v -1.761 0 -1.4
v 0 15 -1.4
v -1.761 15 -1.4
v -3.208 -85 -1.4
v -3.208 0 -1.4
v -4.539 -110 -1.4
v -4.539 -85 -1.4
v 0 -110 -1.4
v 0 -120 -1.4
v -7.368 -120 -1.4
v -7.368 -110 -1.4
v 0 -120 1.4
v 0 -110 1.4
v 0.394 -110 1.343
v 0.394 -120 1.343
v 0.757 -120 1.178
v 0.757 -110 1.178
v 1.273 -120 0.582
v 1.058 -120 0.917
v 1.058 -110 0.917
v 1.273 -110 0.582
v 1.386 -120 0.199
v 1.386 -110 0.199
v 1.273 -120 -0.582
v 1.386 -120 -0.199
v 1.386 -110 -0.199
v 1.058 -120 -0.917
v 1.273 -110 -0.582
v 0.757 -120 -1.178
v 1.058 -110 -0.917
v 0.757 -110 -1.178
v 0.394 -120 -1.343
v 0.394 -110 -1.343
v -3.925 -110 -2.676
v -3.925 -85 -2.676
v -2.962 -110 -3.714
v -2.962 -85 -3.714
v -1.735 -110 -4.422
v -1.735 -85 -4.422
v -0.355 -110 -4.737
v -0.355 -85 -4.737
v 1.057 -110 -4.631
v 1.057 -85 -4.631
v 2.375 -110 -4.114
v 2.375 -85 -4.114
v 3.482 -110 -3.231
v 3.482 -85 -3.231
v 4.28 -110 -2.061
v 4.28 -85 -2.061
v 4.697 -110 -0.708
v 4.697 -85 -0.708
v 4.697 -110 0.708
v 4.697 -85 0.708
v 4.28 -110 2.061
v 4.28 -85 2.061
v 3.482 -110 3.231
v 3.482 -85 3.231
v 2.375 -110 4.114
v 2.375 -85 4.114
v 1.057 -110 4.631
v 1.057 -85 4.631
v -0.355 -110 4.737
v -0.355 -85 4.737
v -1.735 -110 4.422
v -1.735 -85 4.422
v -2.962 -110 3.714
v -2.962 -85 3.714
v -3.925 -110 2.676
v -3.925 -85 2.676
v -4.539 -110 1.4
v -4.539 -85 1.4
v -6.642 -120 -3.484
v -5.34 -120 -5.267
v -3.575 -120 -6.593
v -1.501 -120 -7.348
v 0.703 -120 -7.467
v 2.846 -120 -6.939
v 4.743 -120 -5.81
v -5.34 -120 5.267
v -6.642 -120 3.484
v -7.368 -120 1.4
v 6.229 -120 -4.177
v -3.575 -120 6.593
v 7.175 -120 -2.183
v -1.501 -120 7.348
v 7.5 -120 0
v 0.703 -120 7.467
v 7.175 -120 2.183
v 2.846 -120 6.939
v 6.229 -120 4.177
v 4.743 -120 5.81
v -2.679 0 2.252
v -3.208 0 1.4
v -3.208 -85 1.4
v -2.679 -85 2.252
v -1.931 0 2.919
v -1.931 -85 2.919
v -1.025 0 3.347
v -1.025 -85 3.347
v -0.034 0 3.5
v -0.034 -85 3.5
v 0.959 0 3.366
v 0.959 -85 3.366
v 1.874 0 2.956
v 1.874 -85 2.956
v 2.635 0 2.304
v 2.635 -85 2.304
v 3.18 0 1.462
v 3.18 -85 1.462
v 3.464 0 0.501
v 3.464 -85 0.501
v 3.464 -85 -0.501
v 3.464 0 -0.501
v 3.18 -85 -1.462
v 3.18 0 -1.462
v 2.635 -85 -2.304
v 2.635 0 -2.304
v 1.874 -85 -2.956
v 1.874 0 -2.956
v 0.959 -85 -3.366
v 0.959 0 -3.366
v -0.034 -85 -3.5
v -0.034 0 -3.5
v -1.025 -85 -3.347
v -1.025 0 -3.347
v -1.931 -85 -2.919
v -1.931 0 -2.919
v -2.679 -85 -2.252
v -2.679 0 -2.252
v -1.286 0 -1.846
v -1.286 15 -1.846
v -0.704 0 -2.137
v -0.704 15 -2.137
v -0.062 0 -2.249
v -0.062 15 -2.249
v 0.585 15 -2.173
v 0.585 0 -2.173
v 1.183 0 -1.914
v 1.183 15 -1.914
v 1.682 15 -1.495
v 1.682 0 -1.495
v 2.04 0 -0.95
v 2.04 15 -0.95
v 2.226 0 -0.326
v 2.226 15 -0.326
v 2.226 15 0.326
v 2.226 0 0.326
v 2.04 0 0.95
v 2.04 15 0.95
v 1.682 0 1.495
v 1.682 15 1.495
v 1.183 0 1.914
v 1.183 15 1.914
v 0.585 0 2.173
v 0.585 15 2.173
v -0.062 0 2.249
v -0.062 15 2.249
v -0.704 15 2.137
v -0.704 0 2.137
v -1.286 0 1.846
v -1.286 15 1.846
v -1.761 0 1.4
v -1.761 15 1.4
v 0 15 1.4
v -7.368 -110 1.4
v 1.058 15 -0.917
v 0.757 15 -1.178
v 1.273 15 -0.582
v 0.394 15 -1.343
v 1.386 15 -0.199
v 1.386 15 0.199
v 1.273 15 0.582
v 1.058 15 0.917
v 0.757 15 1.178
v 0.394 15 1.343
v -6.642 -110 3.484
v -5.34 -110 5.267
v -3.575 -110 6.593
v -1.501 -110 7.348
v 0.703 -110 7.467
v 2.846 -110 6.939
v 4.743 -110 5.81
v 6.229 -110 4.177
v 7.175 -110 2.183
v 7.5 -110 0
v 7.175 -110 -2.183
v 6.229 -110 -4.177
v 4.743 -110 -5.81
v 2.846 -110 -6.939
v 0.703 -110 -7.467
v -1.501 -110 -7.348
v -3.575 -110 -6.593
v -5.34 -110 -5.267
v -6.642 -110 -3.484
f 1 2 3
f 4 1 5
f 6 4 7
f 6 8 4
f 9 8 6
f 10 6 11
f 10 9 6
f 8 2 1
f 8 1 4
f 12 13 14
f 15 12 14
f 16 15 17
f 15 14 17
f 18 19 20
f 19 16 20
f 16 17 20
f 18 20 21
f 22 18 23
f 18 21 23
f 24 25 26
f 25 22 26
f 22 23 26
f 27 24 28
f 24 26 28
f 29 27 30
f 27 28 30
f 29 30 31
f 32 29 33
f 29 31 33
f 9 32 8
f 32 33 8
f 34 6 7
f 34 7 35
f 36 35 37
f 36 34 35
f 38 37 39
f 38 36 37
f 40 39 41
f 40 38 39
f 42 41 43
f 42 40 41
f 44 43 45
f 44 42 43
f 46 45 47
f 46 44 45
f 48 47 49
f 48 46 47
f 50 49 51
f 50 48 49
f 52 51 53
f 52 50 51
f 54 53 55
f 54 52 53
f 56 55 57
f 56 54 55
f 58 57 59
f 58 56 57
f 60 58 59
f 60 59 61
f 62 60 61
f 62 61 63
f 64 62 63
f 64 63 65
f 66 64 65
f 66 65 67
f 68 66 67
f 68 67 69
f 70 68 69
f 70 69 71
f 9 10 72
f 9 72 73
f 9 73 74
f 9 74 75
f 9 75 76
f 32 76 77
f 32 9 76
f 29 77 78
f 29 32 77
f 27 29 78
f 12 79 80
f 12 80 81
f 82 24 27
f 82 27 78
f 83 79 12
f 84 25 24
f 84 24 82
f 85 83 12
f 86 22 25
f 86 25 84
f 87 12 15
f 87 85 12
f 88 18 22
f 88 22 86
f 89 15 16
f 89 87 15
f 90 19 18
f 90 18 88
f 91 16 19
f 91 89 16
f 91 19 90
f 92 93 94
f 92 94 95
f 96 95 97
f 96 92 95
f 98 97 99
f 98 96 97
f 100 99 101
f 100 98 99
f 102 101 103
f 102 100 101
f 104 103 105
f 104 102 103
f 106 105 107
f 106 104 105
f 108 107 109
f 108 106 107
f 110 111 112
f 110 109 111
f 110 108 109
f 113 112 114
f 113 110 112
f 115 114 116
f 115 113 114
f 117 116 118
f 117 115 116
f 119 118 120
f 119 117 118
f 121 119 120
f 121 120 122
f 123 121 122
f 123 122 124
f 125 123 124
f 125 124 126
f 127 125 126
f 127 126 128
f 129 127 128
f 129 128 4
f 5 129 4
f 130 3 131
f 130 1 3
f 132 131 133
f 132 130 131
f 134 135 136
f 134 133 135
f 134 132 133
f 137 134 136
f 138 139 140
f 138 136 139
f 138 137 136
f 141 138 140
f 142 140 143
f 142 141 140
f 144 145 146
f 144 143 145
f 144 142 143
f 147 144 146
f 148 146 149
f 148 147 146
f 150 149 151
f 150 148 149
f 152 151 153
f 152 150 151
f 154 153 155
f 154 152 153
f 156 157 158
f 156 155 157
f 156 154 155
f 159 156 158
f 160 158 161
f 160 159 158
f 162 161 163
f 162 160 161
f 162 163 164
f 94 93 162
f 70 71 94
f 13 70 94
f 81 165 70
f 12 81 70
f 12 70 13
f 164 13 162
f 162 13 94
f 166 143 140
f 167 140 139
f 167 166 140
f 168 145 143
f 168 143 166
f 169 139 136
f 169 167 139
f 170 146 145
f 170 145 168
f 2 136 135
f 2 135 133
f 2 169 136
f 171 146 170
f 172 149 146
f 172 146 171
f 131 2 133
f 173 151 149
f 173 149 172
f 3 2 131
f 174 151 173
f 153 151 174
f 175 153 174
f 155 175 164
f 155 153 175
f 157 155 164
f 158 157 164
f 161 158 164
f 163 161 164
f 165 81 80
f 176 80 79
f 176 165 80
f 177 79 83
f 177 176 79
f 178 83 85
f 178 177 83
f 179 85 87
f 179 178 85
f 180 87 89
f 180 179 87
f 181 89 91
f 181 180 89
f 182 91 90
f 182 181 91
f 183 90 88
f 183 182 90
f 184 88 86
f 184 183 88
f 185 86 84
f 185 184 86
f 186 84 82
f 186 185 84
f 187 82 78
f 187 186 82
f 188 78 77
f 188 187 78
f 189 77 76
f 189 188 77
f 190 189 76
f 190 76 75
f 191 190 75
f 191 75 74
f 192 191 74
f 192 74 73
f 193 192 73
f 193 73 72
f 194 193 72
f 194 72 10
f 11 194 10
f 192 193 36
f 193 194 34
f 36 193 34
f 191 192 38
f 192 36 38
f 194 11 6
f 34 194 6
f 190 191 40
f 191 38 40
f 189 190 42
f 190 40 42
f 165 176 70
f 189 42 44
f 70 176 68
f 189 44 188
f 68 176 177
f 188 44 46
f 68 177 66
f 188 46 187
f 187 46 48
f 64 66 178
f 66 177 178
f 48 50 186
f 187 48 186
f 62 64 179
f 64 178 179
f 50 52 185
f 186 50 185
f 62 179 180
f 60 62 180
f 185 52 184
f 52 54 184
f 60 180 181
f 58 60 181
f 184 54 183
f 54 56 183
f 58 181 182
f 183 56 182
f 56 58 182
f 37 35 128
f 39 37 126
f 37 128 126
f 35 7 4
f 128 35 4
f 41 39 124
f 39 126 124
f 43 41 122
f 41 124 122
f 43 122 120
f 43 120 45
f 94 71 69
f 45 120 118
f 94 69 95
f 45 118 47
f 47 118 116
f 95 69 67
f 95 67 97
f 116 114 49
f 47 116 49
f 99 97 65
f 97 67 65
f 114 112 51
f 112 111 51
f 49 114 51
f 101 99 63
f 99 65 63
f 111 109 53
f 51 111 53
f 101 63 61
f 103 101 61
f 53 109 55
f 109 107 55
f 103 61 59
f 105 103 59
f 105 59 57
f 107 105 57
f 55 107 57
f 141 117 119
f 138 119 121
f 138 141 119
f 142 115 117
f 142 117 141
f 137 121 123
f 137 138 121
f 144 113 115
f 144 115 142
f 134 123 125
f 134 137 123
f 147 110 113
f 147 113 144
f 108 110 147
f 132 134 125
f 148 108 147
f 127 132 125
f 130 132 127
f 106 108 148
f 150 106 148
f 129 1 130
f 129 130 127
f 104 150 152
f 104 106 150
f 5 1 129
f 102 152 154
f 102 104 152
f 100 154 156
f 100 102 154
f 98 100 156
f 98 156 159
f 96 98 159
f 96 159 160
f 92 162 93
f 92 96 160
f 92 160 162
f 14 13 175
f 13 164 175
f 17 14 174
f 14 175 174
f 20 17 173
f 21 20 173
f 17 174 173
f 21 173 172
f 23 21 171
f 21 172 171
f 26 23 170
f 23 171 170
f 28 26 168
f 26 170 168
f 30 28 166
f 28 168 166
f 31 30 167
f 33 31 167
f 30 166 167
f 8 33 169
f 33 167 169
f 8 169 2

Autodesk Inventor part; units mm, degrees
ref_plane "YZ Plane" through (0, 0, 0) normal (1, 0, 0) x (0, 1, 0)
ref_plane "XZ Plane" through (0, 0, 0) normal (0, 1, 0) x (-1, 0, 0)
ref_plane "XY Plane" through (0, 0, 0) normal (0, 0, 1) x (1, 0, 0)
sketch "Sketch1" plane through (0, 0, 0) normal (0, 1, 0) x (-1, 0, 0)
  circle A0 centre (0, 0) radius 3.5
  circle A1 centre (0, 0) radius 2.25
  circle A2 centre (0, 0) radius 1.4
  line L0 (0, 0) -> (-1.4, 0)
  line L1 (-1.4, 0) -> (-1.4, -1.4)
  line L2 (-1.4, -1.4) -> (0, -1.4)
  line L3 (0, -1.4) -> (0, 0)
  line L4 (-1.4, -1.4) -> (7.6159, -1.4)
  line L5 (7.6159, -1.4) -> (7.6159, 1.4)
  line L6 (7.6159, 1.4) -> (-1.4, 1.4)
  line L7 (-1.4, 1.4) -> (-1.4, -1.4)
  point P0 (0, 1.4)
  point P1 (3.2078, 1.4)
  point P2 (3.2078, -1.4)
  point P3 (1.7614, 1.4)
  point P4 (1.7614, -1.4)
  dimension "d0" = 7
  dimension "d1" = 4.5
  dimension "d6" = 2.8
extrude "Extrusion1" add sketch "Sketch1" against normal blind 110 contours L6 A1 L4 A0 | L6 L7 L1 L2 L4 A1 | A2 L7 L6 | L2 L1 A2 picked at (2.5783, 1.6484)
extrude "Extrusion2" add sketch "Sketch1" along normal blind 15 contours L6 L7 L1 L2 L4 A1 | A2 L7 L6 | L2 L1 A2
sketch "Sketch2" plane through (0, -110, 0) normal (0, -1, 0) x (1, 0, 0)
  circle A0 centre (0, 0) radius 4.75
  circle A1 centre (0, 0) radius 7.5
  arc A2 (-3.2078, -1.4) -> (-3.2078, 1.4) centre (0, 0) ccw projected
  line L0 (-3.2078, 1.4) -> (0, 1.4) projected
  arc A3 (0, -1.4) -> (0, 1.4) centre (0, 0) ccw projected
  line L1 (0, -1.4) -> (-3.2078, -1.4) projected
  line L2 (1.4, -1.4) -> (-7.6159, -1.4) projected
  line L3 (-7.6159, 1.4) -> (1.4, 1.4) projected
  point P0 (-4.539, 1.4)
  point P1 (-4.539, -1.4)
  point P2 (-7.3682, 1.4)
  point P3 (-7.3682, -1.4)
  dimension "d7" = 9.5
  dimension "d8" = 15
extrude "Extrusion3" add sketch "Sketch2" against normal blind 25 contours A0 L2 A2 L3
extrude "Extrusion4" add sketch "Sketch2" along normal blind 10 contours A0 L2 A2 L3 | A0 L3 A1 L2 | A2 L1 A3 L0 picked at (6.4638, 0.9807)
properties part number "Norhof wire channel top"
